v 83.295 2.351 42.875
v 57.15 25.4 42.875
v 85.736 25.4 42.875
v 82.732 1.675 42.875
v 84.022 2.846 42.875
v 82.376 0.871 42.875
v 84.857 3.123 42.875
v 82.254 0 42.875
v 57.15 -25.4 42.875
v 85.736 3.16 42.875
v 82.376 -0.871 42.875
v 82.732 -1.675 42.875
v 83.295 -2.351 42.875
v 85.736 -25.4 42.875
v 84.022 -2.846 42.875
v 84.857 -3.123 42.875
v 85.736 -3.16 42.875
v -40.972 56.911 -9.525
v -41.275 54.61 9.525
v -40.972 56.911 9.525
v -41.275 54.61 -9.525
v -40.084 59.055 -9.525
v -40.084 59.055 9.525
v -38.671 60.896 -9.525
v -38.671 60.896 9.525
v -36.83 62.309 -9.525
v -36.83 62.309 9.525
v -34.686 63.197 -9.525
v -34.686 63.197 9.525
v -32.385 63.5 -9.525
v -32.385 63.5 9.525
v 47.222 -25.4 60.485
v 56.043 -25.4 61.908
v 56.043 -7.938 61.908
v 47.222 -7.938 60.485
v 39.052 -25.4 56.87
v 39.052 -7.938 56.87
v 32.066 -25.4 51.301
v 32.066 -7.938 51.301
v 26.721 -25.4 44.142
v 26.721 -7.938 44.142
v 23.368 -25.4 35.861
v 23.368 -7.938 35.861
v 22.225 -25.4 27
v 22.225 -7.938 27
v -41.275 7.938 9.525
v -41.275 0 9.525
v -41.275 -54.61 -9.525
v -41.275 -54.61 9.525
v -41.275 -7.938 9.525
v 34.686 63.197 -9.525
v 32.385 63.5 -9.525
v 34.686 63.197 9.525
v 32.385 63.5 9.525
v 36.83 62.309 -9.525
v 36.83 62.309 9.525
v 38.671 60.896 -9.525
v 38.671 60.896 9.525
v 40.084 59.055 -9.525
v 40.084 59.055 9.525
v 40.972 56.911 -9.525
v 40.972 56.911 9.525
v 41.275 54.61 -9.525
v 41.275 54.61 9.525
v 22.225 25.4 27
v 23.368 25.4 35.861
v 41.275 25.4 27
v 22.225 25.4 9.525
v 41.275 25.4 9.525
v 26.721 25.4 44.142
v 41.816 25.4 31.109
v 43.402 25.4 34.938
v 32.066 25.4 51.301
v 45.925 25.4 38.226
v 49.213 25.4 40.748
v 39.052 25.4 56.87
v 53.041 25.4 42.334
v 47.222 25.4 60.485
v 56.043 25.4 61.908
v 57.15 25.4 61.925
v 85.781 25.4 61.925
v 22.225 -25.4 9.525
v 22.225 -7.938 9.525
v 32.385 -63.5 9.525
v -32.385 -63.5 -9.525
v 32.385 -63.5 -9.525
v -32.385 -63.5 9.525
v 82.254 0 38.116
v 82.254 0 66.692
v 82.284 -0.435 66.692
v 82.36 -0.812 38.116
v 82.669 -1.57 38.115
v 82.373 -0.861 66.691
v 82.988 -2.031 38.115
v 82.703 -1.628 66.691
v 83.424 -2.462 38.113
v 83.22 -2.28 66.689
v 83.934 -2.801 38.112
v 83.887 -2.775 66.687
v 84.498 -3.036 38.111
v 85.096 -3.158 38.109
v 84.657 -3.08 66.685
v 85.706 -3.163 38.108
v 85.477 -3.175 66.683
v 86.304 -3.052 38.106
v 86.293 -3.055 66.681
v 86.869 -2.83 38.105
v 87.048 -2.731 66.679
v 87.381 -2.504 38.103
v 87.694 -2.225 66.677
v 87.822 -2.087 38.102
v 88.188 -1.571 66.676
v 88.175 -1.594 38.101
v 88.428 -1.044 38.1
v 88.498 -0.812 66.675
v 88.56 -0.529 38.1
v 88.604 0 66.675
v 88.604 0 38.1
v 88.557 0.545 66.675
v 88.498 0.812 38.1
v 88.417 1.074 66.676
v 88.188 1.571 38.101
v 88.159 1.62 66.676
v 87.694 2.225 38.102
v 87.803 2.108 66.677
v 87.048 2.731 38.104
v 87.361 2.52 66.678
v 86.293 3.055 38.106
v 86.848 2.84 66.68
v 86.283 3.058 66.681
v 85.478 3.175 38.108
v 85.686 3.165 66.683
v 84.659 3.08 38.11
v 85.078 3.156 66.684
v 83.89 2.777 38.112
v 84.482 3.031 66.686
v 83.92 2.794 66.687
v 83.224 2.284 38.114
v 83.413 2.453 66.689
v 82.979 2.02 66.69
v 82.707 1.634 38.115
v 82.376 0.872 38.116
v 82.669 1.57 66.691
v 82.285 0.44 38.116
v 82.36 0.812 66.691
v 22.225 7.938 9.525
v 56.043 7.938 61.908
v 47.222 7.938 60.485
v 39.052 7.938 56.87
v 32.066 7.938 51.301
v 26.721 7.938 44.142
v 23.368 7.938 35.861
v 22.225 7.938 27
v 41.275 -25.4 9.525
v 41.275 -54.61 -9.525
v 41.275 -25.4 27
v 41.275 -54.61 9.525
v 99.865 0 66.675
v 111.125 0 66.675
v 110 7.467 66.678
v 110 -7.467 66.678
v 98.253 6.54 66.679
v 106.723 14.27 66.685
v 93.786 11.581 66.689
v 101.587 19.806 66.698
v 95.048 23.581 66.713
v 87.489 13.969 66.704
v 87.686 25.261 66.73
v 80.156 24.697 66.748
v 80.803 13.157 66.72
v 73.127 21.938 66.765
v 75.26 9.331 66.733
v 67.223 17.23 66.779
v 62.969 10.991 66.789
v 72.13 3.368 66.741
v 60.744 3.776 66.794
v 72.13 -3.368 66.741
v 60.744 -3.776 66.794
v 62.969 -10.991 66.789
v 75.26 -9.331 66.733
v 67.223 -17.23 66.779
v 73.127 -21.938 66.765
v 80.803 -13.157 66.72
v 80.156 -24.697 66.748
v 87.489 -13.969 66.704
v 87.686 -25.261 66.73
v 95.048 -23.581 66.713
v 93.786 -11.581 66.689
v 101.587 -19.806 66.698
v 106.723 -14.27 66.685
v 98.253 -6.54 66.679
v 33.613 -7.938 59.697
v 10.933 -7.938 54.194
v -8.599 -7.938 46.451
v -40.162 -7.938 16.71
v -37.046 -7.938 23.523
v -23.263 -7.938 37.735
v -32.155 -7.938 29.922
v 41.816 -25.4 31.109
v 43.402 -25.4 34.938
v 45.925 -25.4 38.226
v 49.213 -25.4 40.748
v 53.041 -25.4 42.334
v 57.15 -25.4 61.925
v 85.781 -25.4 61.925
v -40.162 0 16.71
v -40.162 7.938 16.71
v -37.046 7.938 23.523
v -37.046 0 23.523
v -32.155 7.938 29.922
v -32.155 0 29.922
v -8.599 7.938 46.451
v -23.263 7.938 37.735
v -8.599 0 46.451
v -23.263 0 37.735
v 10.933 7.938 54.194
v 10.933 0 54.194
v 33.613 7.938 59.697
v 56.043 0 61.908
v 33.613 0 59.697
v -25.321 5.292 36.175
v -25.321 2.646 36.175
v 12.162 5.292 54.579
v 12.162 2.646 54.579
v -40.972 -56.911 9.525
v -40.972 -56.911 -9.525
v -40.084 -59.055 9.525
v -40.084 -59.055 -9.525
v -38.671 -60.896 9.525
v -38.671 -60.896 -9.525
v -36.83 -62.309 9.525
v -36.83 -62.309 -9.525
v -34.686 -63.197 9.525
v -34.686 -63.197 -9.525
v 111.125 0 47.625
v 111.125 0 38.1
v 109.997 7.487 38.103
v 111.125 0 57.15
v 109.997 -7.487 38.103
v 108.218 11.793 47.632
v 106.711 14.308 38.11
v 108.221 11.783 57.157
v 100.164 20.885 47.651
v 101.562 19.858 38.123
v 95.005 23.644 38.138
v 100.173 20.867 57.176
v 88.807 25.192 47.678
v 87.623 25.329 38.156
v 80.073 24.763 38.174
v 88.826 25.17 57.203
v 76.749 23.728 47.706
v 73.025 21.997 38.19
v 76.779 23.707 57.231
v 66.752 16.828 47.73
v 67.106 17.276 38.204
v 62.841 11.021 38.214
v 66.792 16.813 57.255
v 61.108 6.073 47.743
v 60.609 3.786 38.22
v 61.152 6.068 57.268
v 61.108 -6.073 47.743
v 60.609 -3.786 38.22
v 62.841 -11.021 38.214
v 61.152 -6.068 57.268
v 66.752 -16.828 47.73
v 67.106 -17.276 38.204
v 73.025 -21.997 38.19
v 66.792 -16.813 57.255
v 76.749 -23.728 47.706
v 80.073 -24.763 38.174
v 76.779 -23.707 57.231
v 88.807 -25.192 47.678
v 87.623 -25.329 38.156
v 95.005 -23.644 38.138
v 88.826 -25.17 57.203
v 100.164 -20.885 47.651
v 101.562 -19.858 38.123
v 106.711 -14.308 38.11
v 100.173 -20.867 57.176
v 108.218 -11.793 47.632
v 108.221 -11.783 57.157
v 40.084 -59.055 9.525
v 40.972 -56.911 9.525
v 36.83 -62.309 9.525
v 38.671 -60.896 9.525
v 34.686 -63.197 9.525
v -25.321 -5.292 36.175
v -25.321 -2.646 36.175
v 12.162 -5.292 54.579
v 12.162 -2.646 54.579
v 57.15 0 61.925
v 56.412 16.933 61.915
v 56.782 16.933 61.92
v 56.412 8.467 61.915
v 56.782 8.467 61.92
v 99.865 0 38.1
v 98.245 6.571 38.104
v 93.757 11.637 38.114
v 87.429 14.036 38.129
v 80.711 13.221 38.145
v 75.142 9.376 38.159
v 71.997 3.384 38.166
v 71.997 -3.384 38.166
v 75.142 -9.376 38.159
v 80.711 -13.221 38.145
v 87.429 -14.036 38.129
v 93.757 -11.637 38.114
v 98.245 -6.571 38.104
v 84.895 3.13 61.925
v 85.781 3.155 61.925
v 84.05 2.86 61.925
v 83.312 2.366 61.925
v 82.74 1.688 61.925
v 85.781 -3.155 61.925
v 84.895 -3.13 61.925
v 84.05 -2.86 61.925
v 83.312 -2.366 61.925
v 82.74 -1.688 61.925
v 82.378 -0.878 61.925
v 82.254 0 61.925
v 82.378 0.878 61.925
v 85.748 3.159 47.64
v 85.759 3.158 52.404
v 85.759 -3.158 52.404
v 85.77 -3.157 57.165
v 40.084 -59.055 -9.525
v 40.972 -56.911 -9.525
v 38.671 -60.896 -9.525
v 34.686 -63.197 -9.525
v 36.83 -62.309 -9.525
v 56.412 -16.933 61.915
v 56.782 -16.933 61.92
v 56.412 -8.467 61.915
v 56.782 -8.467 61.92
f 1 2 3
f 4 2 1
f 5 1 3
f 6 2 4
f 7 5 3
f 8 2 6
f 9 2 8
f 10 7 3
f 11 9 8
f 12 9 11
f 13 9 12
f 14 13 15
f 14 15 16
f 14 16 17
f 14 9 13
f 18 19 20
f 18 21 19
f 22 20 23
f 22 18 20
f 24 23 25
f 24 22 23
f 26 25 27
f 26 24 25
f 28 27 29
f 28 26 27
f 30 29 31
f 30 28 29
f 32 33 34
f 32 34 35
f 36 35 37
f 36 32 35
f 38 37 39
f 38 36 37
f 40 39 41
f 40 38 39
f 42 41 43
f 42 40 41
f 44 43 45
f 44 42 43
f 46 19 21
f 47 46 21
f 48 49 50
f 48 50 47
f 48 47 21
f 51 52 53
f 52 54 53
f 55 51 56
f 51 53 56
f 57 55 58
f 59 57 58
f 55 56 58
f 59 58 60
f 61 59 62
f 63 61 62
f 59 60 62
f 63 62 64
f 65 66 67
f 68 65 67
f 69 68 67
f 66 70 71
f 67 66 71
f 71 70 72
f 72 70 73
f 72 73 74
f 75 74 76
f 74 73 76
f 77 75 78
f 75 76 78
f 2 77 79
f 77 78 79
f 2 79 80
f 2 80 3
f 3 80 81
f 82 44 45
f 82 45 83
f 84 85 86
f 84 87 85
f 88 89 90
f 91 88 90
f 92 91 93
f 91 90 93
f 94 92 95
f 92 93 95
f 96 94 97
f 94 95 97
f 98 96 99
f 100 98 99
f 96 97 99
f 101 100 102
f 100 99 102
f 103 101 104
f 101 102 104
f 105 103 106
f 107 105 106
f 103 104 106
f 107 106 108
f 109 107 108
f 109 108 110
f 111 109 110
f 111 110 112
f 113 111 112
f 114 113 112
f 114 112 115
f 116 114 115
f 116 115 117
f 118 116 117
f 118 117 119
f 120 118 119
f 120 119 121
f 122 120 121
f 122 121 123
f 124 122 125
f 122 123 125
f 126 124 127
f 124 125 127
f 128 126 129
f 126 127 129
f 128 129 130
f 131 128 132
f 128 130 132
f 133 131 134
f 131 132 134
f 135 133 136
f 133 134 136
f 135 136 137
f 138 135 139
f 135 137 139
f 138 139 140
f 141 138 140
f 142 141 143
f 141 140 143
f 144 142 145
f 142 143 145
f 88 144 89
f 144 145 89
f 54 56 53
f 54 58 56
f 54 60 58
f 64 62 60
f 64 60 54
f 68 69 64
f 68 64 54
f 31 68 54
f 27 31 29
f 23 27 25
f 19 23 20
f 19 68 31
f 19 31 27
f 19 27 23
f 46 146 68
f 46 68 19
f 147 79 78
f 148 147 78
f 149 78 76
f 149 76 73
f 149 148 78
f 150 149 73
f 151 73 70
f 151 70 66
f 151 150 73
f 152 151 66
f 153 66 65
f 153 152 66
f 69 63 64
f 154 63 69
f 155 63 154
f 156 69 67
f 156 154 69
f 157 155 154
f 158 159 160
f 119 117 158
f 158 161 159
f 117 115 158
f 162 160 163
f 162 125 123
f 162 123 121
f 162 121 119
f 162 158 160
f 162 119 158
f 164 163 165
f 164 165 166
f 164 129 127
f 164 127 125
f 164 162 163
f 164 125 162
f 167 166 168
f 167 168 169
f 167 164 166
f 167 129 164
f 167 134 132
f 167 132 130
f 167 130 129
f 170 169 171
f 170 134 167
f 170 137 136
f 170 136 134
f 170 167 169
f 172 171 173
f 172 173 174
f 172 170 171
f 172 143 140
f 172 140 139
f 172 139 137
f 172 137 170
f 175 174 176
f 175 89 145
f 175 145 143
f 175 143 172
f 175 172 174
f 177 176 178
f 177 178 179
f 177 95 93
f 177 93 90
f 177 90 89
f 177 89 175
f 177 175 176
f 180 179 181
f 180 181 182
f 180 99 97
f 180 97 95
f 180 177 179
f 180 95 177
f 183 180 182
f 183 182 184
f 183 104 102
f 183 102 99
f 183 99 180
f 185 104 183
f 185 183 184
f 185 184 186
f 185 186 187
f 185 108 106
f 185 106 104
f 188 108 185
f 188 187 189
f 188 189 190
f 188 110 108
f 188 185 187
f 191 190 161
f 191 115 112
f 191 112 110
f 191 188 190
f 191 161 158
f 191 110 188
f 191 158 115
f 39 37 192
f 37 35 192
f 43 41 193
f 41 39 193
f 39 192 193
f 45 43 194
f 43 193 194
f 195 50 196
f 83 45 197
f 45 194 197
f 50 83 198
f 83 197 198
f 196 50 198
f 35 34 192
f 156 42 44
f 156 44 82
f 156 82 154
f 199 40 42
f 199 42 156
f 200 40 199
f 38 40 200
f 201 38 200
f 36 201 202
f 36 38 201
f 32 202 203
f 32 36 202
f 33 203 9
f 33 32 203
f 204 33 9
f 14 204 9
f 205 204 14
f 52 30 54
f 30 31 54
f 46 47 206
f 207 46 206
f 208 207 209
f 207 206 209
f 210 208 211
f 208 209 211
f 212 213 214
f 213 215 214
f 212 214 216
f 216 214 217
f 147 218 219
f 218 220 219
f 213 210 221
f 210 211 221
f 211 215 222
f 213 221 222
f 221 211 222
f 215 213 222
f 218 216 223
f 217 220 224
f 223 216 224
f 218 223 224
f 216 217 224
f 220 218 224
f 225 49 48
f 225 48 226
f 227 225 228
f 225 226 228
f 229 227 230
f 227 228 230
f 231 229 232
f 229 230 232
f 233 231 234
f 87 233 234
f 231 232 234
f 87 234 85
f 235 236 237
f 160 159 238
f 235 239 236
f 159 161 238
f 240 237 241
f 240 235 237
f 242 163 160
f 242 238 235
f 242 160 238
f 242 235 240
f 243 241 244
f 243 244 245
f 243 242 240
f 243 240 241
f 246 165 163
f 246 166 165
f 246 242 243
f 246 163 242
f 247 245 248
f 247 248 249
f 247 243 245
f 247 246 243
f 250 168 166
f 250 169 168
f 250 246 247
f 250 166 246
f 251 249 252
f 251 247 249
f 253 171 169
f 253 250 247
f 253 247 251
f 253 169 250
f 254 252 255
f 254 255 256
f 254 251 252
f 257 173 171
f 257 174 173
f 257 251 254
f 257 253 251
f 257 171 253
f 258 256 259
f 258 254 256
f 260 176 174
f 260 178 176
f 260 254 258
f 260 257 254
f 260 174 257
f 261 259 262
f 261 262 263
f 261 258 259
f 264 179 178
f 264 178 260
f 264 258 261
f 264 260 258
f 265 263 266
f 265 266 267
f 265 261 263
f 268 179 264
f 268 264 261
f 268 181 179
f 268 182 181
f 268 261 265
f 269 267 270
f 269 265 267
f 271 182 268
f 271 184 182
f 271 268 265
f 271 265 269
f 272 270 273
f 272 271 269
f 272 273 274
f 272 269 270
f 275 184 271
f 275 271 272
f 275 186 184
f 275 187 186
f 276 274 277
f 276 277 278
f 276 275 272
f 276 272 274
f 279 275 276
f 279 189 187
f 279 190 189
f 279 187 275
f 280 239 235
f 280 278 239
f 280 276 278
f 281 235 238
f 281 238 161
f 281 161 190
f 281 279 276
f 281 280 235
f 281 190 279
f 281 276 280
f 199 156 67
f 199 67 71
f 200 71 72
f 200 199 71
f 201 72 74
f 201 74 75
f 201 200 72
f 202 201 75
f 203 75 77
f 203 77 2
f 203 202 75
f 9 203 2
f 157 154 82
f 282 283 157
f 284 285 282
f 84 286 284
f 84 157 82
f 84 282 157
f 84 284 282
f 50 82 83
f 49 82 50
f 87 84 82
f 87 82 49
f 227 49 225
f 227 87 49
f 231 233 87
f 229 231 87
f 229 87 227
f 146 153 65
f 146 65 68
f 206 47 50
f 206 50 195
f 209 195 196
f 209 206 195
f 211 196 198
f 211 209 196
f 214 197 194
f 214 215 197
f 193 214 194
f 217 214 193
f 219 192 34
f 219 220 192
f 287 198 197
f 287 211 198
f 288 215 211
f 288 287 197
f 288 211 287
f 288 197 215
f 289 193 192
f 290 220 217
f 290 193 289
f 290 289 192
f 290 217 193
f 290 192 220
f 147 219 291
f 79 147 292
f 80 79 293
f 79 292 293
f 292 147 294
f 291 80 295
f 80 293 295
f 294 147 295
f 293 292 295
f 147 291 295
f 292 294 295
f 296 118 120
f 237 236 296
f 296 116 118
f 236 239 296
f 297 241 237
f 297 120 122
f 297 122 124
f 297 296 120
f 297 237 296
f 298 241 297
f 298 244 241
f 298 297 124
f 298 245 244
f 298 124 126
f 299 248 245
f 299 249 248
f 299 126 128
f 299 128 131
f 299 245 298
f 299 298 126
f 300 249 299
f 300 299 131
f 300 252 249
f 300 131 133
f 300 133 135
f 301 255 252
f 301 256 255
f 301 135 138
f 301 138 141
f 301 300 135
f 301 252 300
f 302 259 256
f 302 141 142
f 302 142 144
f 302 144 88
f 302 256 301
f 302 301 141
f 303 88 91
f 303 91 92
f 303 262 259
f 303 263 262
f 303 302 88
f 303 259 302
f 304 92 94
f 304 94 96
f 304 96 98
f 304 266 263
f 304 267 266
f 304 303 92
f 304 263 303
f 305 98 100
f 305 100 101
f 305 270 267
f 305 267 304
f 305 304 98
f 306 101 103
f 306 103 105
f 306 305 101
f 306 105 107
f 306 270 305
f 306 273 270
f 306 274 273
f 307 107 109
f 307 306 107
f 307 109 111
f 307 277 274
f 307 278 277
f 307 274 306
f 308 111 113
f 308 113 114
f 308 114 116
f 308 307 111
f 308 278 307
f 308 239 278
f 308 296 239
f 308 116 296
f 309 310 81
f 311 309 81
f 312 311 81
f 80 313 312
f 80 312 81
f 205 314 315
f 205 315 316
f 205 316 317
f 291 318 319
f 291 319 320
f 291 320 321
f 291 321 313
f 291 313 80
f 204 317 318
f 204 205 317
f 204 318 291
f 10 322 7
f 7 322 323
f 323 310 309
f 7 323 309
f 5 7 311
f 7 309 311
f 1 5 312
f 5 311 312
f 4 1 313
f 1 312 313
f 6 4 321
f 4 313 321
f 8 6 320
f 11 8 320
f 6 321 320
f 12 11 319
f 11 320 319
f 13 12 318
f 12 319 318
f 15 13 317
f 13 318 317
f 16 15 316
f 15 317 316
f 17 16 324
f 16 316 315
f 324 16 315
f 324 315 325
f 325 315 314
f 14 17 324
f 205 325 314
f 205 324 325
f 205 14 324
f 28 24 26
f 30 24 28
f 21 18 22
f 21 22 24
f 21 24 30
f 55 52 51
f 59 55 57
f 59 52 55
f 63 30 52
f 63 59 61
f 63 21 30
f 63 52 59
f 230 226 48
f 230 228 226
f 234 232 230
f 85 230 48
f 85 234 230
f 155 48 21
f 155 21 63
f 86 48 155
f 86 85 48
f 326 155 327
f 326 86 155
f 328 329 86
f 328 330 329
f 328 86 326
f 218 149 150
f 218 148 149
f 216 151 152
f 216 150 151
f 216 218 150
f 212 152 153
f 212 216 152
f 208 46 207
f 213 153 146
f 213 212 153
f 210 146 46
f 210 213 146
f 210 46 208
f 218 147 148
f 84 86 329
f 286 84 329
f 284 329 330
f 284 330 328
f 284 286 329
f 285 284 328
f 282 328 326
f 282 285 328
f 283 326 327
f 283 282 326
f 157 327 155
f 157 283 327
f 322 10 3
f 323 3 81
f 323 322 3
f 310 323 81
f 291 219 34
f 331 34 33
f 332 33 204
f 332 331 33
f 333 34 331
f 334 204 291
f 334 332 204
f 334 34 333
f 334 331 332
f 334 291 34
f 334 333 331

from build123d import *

# Parameters (mm, degrees)
F1_DEPTH = 63.5
F2_DEPTH = 25.4
F3_DEPTH = 7.9375
F5_R     = 8.89
F7_D     = 6.35
F7_2_D   = 6.35


with BuildPart() as f1:
    # F0 (on Front) → F1 (new body, symmetric)
    with BuildSketch(Plane.XZ):
        Polygon((22.2249999642, 9.525), (-41.275, 9.525), (-41.275, -9.525), (41.275, -9.525), (41.275, 9.525), align=None)
    extrude(amount=F1_DEPTH, both=True)

    # F0 (on Front) → F2 (join, symmetric)
    with BuildSketch(Plane.XZ):
        Polygon((85.7813953628, 61.9252000358), (60.325, 61.9252000358), (60.325, 42.8752), (85.7363031217, 42.8752), align=None)
        with BuildLine():
            Line((22.2249999642, 27.0002), (22.2249999642, 9.525))
            Line((22.2249999642, 9.525), (41.275, 9.525))
            Line((41.275, 9.525), (41.275, 27.0002))
            ThreePointArc((41.275, 27.0002), (45.9246798487, 38.2255201513), (57.15, 42.8752))
            Line((57.15, 42.8752), (60.325, 42.8752))
            Line((60.325, 42.8752), (60.325, 61.9252000358))
            Line((60.325, 61.9252000358), (57.15, 61.9252000358))
            add(Edge.make_bspline(
                [(56.042588155, 61.9076385555), (56.412756811, 61.9151124131), (56.7819095917, 61.9209691364), (57.15, 61.9252000358)],
                knots=[110.5311987842, 110.5311987842, 110.5311987842, 110.5311987842, 111.5045361803, 111.5045361803, 111.5045361803, 111.5045361803], degree=3))
            ThreePointArc((56.042588155, 61.9076385555), (32.065821857, 51.3012212622), (22.2249999642, 27.0002))
        make_face()
    extrude(amount=F2_DEPTH, both=True)

    # F0 (on Front) → F3 (join, symmetric)
    with BuildSketch(Plane.XZ):
        with BuildLine():
            add(Edge.make_bspline(
                [(-41.275, 9.525), (-41.1297210177, 39.3562083793), (14.0066143451, 61.0589149332), (56.042588155, 61.9076385555)],
                knots=[0, 0, 0, 0, 110.5311987842, 110.5311987842, 110.5311987842, 110.5311987842], degree=3))
            Line((-41.275, 9.525), (22.2249999642, 9.525))
            Line((22.2249999642, 9.525), (22.2249999642, 27.0002))
            ThreePointArc((22.2249999642, 27.0002), (32.065821857, 51.3012212622), (56.042588155, 61.9076385555))
        make_face()
    extrude(amount=F3_DEPTH, both=True)

    # F5
    f5_edges = [f1.edges().sort_by_distance(p)[0] for p in [
        (-41.275, -63.5, 0),
        (41.275, -63.5, 0),
        (41.275, 63.5, 0),
        (-41.275, 63.5, 0),
    ]]
    fillet(f5_edges, radius=F5_R)

    # F7 (through all)
    with Locations(Plane(origin=(0, 0, 0), x_dir=(1, 0, 0), z_dir=(0, 0, -1))):
        with Locations((85.4290425777, 0)):
            Hole(F7_D / 2)


with BuildPart() as f4:
    # F0 (on Front) → F4 (revolve)
    with BuildSketch(Plane.XZ):
        Polygon((85.7926383615, 66.675), (85.7813953628, 61.9252000358), (85.7363031217, 42.8752), (85.725, 38.1), (111.125, 38.1), (111.125, 66.675), align=None)
    revolve(axis=Axis((85.7588191807, 0, 52.3875), (0.0023670401, 0, 0.9999971986)))

    # F7#2 (through all)
    with Locations(Plane(origin=(0, 0, 0), x_dir=(1, 0, 0), z_dir=(0, 0, -1))):
        with Locations((85.4290425777, 0)):
            Hole(F7_2_D / 2)


solid = Compound([f1.part, f4.part])
